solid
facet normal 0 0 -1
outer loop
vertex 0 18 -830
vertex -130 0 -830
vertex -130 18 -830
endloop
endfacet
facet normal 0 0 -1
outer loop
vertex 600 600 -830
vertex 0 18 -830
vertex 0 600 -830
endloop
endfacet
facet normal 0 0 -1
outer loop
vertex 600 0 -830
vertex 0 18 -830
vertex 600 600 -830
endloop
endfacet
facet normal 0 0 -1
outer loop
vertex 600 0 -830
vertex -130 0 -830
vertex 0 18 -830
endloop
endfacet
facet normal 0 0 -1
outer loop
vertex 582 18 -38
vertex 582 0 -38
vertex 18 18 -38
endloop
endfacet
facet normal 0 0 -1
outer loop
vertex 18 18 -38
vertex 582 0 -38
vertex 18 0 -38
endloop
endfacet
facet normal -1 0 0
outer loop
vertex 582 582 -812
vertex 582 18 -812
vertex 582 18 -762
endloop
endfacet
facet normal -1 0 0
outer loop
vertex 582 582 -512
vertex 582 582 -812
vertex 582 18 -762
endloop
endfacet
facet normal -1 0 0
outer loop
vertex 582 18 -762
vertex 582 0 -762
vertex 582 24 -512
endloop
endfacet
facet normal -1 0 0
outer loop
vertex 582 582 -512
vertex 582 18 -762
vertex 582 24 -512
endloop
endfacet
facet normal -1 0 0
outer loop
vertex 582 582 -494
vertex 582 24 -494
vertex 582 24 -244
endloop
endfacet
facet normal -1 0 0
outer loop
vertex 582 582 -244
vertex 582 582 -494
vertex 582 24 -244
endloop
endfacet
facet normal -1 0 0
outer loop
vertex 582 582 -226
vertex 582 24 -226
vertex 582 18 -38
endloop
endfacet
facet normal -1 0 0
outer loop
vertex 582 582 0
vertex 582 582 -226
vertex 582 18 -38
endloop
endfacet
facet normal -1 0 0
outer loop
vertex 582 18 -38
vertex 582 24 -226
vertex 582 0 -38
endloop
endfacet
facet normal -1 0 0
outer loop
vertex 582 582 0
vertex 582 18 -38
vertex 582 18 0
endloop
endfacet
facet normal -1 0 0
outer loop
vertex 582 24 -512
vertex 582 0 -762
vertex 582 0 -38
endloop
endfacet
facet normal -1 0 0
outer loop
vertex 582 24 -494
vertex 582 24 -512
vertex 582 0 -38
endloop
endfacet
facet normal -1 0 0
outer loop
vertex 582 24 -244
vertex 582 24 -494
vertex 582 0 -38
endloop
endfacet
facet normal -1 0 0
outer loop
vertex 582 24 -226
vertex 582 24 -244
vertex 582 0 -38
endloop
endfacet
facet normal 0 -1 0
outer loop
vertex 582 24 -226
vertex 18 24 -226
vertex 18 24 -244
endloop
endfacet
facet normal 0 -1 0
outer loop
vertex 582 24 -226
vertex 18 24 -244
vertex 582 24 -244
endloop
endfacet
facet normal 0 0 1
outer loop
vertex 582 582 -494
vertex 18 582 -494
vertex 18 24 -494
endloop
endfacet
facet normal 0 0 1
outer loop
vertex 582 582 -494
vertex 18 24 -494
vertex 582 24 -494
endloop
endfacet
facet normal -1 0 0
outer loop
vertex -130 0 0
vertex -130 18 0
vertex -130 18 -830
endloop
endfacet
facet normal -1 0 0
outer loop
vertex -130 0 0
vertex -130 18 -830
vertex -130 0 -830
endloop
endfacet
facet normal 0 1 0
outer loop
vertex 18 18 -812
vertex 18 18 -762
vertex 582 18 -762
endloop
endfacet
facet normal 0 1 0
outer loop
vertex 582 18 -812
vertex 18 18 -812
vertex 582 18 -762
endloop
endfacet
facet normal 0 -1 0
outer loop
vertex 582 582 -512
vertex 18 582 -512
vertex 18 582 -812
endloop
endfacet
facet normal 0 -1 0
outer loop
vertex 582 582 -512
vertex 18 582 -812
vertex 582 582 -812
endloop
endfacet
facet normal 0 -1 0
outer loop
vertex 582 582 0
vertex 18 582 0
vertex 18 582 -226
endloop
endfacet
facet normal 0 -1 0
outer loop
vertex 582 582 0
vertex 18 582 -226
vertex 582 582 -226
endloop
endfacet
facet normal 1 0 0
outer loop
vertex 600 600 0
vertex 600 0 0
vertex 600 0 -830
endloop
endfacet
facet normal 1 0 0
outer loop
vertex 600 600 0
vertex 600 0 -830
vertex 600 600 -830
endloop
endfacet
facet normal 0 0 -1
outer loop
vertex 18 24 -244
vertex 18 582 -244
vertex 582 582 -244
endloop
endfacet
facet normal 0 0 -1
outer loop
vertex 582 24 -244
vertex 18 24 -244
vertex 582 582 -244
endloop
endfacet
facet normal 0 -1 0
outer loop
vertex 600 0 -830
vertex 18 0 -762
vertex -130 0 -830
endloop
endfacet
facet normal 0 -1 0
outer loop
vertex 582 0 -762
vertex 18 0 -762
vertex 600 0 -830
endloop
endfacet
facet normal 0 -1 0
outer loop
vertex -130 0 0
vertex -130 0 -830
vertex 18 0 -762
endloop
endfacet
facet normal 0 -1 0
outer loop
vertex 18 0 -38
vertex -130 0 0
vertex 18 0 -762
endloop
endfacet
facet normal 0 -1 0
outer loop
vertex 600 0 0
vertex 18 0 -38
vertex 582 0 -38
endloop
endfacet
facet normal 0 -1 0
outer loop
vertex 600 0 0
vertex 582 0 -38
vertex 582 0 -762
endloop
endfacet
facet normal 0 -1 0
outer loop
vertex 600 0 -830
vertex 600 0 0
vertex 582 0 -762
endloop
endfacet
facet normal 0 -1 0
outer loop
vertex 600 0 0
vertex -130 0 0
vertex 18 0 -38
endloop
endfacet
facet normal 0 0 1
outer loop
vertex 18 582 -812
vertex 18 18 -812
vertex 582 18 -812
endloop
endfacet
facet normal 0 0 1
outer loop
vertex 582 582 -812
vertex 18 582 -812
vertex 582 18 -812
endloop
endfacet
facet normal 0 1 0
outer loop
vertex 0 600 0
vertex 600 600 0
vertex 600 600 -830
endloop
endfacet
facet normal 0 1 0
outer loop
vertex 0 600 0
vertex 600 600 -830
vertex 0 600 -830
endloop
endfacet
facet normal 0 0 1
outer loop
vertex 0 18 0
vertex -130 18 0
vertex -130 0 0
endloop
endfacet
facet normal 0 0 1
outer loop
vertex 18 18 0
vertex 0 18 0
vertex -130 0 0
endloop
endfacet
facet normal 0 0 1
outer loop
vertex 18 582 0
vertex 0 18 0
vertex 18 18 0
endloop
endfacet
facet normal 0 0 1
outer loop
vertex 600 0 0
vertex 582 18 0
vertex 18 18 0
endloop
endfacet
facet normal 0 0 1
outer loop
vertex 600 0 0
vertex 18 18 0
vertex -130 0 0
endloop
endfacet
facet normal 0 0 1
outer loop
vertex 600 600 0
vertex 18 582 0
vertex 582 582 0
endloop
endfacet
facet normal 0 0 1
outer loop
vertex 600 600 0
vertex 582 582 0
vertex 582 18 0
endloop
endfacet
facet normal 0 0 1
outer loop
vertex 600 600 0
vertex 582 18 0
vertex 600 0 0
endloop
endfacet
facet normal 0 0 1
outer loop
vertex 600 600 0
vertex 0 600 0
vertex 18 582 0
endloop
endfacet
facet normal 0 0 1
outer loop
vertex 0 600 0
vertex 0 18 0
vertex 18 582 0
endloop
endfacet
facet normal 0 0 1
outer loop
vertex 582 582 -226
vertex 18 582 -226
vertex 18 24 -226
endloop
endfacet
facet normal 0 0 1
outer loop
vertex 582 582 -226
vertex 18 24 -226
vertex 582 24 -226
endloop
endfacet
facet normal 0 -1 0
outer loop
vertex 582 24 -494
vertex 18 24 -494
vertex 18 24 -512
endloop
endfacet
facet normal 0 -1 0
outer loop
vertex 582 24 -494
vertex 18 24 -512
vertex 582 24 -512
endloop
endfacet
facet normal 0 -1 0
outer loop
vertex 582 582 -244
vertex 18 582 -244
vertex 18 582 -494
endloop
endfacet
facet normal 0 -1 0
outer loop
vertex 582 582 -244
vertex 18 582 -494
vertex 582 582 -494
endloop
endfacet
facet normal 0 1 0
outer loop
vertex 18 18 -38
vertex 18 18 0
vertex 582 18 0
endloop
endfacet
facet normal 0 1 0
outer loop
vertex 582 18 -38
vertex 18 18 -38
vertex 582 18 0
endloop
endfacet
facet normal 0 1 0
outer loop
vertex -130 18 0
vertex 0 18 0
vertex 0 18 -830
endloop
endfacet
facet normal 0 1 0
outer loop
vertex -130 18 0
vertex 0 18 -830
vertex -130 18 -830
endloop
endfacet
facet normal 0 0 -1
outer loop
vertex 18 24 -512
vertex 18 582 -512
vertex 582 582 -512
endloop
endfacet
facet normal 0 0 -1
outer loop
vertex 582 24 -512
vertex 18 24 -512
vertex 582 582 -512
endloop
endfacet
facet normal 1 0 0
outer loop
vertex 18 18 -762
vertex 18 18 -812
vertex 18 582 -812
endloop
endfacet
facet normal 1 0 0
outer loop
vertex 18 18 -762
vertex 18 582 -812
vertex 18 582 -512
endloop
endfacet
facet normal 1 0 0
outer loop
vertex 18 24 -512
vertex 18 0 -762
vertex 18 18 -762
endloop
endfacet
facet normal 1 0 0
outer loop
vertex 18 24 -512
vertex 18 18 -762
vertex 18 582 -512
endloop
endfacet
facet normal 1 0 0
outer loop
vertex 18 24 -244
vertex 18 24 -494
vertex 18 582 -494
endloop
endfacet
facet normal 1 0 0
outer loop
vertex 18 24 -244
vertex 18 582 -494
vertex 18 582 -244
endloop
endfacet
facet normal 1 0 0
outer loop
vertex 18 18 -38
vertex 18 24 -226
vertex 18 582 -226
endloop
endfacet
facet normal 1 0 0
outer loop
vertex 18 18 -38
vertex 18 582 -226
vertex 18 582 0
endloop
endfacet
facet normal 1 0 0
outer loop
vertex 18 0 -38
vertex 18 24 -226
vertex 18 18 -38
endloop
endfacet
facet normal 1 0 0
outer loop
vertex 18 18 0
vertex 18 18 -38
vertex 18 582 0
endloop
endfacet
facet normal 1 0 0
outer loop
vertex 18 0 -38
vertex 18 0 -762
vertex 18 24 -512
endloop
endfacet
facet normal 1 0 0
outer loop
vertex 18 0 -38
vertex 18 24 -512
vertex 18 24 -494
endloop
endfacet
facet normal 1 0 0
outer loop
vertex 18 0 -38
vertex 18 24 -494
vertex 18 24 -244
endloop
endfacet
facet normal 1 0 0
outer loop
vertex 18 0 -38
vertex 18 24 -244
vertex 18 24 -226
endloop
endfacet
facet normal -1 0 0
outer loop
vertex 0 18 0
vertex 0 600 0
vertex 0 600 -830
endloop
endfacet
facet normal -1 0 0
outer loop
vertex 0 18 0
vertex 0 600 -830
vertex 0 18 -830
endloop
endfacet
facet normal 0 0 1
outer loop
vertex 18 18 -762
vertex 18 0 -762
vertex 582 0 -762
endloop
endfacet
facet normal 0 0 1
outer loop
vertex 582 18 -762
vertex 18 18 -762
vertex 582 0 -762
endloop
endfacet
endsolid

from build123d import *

# Parameters (mm, degrees)
F0_W     = 564
F0_H     = 564
F1_DEPTH = 830
F2_W     = 282
F2_H     = 724
F3_DEPTH = 244
F4_W     = 564
F4_H     = 564
F5_DEPTH = 18
F6_W     = 564
F6_H     = 18
F7_DEPTH = 558


with BuildPart() as f1:
    # F0 (on Top) → F1 (new body)
    with BuildSketch(Plane.XY):
        Polygon((-130, 0), (0, 0), (600, 0), (600, 600), (0, 600), (0, 18), (-130, 18), align=None)
        with Locations((300, 300)):
            Rectangle(F0_W, F0_H, mode=Mode.SUBTRACT)
    extrude(amount=-F1_DEPTH)

    # F2 (on face) → F3 (cut)
    with BuildSketch(Plane.XZ):
        with Locations((159, -400)):
            Rectangle(F2_W, F2_H)
        with Locations((441, -400)):
            Rectangle(F2_W, F2_H)
    extrude(amount=-F3_DEPTH, mode=Mode.SUBTRACT)

    # F4 (on face) → F5 (join)
    with BuildSketch(Plane(origin=(0, 0, -830), x_dir=(1, 0, 0), z_dir=(0, 0, -1))):
        with Locations((300, -300)):
            Rectangle(F4_W, F4_H)
    extrude(amount=-F5_DEPTH)

    # F6 (on face) → F7 (join)
    with BuildSketch(Plane.XZ.offset(-582)):
        with Locations((300, -235)):
            Rectangle(F6_W, F6_H)
        with Locations((300, -503)):
            Rectangle(F6_W, F6_H)
    extrude(amount=F7_DEPTH)


solid = f1.part
